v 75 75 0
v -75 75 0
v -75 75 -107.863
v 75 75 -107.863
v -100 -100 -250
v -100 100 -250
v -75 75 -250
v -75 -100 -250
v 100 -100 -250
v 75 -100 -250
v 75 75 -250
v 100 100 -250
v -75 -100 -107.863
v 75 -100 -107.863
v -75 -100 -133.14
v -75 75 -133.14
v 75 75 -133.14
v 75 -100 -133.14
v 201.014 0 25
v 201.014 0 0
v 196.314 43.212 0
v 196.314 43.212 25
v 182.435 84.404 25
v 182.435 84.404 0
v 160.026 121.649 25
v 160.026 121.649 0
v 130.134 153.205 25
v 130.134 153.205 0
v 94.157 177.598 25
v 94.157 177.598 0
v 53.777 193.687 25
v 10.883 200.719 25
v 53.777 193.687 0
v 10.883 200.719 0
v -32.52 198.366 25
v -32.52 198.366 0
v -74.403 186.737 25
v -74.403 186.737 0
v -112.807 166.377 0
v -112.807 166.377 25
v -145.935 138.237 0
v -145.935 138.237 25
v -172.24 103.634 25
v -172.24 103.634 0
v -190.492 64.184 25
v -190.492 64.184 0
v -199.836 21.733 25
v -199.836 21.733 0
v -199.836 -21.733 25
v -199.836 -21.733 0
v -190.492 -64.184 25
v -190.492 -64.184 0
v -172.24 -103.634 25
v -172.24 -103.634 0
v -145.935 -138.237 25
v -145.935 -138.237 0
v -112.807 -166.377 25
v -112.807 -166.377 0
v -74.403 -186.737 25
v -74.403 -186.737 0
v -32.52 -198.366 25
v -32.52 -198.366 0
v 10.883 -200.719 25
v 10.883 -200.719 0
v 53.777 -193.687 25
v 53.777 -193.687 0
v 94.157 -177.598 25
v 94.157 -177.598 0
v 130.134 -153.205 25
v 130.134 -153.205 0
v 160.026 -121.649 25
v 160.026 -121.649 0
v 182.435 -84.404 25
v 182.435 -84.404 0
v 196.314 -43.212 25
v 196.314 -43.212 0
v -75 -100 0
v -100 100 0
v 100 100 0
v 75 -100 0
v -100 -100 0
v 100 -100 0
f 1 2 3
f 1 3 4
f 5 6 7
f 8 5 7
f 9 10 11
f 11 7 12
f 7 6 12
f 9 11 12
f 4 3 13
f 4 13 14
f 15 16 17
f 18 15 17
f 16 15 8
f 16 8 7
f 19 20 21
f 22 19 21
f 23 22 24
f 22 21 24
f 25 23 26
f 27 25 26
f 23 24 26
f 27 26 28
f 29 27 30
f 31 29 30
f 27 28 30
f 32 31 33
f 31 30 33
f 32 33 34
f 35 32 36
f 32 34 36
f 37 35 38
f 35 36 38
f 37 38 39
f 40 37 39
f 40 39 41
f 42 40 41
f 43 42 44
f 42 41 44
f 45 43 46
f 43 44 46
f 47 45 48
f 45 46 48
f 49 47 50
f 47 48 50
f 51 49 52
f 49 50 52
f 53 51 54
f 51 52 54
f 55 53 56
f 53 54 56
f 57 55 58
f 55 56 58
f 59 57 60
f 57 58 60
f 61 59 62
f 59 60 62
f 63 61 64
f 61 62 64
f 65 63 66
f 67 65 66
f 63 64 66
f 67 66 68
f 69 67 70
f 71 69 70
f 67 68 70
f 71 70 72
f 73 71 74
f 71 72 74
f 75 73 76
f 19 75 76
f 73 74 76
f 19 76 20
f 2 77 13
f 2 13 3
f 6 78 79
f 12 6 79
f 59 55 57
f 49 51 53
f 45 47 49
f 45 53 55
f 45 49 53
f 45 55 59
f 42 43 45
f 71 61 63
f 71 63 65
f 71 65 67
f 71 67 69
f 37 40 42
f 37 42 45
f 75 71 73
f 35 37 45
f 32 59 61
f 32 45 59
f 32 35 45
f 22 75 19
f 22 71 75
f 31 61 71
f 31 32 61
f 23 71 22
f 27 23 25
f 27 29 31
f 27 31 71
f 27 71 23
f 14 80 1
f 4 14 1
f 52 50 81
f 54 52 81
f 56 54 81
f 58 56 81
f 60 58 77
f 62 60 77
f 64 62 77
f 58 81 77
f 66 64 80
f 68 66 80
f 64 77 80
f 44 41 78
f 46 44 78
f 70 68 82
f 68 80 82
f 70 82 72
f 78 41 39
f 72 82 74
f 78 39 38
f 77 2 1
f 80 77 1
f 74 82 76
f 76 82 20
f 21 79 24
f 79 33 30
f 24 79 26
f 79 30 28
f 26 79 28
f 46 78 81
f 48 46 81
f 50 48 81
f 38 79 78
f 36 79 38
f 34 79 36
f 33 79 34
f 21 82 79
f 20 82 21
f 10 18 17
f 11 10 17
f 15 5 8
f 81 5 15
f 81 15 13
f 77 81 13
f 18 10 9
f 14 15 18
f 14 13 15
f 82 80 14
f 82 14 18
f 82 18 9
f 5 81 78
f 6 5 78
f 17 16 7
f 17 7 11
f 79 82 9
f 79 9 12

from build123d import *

# Parameters (mm, degrees)
F0_W     = 200
F0_H     = 200
F1_DEPTH = 250
F2_T     = -25
F3_W     = 150
F3_H     = 25.2777785063
F4_DEPTH = 175
F5_R     = 201.014082537
F6_DEPTH = 25


with BuildPart() as f1:
    # F0 (on Top) → F1 (new body)
    with BuildSketch(Plane.XY):
        Rectangle(F0_W, F0_H)
    extrude(amount=-F1_DEPTH)

    # F2
    f2_openings = [f1.faces().sort_by_distance(p)[0] for p in [
        (0, -100, -125),
        (0, 0, 0),
        (0, 0, -250),
    ]]
    offset(amount=F2_T, openings=f2_openings)

    # F3 (on face) → F4 (join)
    with BuildSketch(Plane.XZ.offset(-75)):
        with Locations((0, -120.5015406013)):
            Rectangle(F3_W, F3_H)
    extrude(amount=F4_DEPTH)

    # F5 (on face) → F6 (join)
    with BuildSketch(Plane.XY):
        Circle(F5_R)
        Polygon((-75, -100), (-100, -100), (-100, 100), (100, 100), (100, -100), (75, -100), (75, 75), (-75, 75), align=None, mode=Mode.SUBTRACT)
        Polygon((-100, 100), (-100, -100), (-75, -100), (-75, 75), (75, 75), (75, -100), (100, -100), (100, 100), align=None)
    extrude(amount=F6_DEPTH)


solid = f1.part
